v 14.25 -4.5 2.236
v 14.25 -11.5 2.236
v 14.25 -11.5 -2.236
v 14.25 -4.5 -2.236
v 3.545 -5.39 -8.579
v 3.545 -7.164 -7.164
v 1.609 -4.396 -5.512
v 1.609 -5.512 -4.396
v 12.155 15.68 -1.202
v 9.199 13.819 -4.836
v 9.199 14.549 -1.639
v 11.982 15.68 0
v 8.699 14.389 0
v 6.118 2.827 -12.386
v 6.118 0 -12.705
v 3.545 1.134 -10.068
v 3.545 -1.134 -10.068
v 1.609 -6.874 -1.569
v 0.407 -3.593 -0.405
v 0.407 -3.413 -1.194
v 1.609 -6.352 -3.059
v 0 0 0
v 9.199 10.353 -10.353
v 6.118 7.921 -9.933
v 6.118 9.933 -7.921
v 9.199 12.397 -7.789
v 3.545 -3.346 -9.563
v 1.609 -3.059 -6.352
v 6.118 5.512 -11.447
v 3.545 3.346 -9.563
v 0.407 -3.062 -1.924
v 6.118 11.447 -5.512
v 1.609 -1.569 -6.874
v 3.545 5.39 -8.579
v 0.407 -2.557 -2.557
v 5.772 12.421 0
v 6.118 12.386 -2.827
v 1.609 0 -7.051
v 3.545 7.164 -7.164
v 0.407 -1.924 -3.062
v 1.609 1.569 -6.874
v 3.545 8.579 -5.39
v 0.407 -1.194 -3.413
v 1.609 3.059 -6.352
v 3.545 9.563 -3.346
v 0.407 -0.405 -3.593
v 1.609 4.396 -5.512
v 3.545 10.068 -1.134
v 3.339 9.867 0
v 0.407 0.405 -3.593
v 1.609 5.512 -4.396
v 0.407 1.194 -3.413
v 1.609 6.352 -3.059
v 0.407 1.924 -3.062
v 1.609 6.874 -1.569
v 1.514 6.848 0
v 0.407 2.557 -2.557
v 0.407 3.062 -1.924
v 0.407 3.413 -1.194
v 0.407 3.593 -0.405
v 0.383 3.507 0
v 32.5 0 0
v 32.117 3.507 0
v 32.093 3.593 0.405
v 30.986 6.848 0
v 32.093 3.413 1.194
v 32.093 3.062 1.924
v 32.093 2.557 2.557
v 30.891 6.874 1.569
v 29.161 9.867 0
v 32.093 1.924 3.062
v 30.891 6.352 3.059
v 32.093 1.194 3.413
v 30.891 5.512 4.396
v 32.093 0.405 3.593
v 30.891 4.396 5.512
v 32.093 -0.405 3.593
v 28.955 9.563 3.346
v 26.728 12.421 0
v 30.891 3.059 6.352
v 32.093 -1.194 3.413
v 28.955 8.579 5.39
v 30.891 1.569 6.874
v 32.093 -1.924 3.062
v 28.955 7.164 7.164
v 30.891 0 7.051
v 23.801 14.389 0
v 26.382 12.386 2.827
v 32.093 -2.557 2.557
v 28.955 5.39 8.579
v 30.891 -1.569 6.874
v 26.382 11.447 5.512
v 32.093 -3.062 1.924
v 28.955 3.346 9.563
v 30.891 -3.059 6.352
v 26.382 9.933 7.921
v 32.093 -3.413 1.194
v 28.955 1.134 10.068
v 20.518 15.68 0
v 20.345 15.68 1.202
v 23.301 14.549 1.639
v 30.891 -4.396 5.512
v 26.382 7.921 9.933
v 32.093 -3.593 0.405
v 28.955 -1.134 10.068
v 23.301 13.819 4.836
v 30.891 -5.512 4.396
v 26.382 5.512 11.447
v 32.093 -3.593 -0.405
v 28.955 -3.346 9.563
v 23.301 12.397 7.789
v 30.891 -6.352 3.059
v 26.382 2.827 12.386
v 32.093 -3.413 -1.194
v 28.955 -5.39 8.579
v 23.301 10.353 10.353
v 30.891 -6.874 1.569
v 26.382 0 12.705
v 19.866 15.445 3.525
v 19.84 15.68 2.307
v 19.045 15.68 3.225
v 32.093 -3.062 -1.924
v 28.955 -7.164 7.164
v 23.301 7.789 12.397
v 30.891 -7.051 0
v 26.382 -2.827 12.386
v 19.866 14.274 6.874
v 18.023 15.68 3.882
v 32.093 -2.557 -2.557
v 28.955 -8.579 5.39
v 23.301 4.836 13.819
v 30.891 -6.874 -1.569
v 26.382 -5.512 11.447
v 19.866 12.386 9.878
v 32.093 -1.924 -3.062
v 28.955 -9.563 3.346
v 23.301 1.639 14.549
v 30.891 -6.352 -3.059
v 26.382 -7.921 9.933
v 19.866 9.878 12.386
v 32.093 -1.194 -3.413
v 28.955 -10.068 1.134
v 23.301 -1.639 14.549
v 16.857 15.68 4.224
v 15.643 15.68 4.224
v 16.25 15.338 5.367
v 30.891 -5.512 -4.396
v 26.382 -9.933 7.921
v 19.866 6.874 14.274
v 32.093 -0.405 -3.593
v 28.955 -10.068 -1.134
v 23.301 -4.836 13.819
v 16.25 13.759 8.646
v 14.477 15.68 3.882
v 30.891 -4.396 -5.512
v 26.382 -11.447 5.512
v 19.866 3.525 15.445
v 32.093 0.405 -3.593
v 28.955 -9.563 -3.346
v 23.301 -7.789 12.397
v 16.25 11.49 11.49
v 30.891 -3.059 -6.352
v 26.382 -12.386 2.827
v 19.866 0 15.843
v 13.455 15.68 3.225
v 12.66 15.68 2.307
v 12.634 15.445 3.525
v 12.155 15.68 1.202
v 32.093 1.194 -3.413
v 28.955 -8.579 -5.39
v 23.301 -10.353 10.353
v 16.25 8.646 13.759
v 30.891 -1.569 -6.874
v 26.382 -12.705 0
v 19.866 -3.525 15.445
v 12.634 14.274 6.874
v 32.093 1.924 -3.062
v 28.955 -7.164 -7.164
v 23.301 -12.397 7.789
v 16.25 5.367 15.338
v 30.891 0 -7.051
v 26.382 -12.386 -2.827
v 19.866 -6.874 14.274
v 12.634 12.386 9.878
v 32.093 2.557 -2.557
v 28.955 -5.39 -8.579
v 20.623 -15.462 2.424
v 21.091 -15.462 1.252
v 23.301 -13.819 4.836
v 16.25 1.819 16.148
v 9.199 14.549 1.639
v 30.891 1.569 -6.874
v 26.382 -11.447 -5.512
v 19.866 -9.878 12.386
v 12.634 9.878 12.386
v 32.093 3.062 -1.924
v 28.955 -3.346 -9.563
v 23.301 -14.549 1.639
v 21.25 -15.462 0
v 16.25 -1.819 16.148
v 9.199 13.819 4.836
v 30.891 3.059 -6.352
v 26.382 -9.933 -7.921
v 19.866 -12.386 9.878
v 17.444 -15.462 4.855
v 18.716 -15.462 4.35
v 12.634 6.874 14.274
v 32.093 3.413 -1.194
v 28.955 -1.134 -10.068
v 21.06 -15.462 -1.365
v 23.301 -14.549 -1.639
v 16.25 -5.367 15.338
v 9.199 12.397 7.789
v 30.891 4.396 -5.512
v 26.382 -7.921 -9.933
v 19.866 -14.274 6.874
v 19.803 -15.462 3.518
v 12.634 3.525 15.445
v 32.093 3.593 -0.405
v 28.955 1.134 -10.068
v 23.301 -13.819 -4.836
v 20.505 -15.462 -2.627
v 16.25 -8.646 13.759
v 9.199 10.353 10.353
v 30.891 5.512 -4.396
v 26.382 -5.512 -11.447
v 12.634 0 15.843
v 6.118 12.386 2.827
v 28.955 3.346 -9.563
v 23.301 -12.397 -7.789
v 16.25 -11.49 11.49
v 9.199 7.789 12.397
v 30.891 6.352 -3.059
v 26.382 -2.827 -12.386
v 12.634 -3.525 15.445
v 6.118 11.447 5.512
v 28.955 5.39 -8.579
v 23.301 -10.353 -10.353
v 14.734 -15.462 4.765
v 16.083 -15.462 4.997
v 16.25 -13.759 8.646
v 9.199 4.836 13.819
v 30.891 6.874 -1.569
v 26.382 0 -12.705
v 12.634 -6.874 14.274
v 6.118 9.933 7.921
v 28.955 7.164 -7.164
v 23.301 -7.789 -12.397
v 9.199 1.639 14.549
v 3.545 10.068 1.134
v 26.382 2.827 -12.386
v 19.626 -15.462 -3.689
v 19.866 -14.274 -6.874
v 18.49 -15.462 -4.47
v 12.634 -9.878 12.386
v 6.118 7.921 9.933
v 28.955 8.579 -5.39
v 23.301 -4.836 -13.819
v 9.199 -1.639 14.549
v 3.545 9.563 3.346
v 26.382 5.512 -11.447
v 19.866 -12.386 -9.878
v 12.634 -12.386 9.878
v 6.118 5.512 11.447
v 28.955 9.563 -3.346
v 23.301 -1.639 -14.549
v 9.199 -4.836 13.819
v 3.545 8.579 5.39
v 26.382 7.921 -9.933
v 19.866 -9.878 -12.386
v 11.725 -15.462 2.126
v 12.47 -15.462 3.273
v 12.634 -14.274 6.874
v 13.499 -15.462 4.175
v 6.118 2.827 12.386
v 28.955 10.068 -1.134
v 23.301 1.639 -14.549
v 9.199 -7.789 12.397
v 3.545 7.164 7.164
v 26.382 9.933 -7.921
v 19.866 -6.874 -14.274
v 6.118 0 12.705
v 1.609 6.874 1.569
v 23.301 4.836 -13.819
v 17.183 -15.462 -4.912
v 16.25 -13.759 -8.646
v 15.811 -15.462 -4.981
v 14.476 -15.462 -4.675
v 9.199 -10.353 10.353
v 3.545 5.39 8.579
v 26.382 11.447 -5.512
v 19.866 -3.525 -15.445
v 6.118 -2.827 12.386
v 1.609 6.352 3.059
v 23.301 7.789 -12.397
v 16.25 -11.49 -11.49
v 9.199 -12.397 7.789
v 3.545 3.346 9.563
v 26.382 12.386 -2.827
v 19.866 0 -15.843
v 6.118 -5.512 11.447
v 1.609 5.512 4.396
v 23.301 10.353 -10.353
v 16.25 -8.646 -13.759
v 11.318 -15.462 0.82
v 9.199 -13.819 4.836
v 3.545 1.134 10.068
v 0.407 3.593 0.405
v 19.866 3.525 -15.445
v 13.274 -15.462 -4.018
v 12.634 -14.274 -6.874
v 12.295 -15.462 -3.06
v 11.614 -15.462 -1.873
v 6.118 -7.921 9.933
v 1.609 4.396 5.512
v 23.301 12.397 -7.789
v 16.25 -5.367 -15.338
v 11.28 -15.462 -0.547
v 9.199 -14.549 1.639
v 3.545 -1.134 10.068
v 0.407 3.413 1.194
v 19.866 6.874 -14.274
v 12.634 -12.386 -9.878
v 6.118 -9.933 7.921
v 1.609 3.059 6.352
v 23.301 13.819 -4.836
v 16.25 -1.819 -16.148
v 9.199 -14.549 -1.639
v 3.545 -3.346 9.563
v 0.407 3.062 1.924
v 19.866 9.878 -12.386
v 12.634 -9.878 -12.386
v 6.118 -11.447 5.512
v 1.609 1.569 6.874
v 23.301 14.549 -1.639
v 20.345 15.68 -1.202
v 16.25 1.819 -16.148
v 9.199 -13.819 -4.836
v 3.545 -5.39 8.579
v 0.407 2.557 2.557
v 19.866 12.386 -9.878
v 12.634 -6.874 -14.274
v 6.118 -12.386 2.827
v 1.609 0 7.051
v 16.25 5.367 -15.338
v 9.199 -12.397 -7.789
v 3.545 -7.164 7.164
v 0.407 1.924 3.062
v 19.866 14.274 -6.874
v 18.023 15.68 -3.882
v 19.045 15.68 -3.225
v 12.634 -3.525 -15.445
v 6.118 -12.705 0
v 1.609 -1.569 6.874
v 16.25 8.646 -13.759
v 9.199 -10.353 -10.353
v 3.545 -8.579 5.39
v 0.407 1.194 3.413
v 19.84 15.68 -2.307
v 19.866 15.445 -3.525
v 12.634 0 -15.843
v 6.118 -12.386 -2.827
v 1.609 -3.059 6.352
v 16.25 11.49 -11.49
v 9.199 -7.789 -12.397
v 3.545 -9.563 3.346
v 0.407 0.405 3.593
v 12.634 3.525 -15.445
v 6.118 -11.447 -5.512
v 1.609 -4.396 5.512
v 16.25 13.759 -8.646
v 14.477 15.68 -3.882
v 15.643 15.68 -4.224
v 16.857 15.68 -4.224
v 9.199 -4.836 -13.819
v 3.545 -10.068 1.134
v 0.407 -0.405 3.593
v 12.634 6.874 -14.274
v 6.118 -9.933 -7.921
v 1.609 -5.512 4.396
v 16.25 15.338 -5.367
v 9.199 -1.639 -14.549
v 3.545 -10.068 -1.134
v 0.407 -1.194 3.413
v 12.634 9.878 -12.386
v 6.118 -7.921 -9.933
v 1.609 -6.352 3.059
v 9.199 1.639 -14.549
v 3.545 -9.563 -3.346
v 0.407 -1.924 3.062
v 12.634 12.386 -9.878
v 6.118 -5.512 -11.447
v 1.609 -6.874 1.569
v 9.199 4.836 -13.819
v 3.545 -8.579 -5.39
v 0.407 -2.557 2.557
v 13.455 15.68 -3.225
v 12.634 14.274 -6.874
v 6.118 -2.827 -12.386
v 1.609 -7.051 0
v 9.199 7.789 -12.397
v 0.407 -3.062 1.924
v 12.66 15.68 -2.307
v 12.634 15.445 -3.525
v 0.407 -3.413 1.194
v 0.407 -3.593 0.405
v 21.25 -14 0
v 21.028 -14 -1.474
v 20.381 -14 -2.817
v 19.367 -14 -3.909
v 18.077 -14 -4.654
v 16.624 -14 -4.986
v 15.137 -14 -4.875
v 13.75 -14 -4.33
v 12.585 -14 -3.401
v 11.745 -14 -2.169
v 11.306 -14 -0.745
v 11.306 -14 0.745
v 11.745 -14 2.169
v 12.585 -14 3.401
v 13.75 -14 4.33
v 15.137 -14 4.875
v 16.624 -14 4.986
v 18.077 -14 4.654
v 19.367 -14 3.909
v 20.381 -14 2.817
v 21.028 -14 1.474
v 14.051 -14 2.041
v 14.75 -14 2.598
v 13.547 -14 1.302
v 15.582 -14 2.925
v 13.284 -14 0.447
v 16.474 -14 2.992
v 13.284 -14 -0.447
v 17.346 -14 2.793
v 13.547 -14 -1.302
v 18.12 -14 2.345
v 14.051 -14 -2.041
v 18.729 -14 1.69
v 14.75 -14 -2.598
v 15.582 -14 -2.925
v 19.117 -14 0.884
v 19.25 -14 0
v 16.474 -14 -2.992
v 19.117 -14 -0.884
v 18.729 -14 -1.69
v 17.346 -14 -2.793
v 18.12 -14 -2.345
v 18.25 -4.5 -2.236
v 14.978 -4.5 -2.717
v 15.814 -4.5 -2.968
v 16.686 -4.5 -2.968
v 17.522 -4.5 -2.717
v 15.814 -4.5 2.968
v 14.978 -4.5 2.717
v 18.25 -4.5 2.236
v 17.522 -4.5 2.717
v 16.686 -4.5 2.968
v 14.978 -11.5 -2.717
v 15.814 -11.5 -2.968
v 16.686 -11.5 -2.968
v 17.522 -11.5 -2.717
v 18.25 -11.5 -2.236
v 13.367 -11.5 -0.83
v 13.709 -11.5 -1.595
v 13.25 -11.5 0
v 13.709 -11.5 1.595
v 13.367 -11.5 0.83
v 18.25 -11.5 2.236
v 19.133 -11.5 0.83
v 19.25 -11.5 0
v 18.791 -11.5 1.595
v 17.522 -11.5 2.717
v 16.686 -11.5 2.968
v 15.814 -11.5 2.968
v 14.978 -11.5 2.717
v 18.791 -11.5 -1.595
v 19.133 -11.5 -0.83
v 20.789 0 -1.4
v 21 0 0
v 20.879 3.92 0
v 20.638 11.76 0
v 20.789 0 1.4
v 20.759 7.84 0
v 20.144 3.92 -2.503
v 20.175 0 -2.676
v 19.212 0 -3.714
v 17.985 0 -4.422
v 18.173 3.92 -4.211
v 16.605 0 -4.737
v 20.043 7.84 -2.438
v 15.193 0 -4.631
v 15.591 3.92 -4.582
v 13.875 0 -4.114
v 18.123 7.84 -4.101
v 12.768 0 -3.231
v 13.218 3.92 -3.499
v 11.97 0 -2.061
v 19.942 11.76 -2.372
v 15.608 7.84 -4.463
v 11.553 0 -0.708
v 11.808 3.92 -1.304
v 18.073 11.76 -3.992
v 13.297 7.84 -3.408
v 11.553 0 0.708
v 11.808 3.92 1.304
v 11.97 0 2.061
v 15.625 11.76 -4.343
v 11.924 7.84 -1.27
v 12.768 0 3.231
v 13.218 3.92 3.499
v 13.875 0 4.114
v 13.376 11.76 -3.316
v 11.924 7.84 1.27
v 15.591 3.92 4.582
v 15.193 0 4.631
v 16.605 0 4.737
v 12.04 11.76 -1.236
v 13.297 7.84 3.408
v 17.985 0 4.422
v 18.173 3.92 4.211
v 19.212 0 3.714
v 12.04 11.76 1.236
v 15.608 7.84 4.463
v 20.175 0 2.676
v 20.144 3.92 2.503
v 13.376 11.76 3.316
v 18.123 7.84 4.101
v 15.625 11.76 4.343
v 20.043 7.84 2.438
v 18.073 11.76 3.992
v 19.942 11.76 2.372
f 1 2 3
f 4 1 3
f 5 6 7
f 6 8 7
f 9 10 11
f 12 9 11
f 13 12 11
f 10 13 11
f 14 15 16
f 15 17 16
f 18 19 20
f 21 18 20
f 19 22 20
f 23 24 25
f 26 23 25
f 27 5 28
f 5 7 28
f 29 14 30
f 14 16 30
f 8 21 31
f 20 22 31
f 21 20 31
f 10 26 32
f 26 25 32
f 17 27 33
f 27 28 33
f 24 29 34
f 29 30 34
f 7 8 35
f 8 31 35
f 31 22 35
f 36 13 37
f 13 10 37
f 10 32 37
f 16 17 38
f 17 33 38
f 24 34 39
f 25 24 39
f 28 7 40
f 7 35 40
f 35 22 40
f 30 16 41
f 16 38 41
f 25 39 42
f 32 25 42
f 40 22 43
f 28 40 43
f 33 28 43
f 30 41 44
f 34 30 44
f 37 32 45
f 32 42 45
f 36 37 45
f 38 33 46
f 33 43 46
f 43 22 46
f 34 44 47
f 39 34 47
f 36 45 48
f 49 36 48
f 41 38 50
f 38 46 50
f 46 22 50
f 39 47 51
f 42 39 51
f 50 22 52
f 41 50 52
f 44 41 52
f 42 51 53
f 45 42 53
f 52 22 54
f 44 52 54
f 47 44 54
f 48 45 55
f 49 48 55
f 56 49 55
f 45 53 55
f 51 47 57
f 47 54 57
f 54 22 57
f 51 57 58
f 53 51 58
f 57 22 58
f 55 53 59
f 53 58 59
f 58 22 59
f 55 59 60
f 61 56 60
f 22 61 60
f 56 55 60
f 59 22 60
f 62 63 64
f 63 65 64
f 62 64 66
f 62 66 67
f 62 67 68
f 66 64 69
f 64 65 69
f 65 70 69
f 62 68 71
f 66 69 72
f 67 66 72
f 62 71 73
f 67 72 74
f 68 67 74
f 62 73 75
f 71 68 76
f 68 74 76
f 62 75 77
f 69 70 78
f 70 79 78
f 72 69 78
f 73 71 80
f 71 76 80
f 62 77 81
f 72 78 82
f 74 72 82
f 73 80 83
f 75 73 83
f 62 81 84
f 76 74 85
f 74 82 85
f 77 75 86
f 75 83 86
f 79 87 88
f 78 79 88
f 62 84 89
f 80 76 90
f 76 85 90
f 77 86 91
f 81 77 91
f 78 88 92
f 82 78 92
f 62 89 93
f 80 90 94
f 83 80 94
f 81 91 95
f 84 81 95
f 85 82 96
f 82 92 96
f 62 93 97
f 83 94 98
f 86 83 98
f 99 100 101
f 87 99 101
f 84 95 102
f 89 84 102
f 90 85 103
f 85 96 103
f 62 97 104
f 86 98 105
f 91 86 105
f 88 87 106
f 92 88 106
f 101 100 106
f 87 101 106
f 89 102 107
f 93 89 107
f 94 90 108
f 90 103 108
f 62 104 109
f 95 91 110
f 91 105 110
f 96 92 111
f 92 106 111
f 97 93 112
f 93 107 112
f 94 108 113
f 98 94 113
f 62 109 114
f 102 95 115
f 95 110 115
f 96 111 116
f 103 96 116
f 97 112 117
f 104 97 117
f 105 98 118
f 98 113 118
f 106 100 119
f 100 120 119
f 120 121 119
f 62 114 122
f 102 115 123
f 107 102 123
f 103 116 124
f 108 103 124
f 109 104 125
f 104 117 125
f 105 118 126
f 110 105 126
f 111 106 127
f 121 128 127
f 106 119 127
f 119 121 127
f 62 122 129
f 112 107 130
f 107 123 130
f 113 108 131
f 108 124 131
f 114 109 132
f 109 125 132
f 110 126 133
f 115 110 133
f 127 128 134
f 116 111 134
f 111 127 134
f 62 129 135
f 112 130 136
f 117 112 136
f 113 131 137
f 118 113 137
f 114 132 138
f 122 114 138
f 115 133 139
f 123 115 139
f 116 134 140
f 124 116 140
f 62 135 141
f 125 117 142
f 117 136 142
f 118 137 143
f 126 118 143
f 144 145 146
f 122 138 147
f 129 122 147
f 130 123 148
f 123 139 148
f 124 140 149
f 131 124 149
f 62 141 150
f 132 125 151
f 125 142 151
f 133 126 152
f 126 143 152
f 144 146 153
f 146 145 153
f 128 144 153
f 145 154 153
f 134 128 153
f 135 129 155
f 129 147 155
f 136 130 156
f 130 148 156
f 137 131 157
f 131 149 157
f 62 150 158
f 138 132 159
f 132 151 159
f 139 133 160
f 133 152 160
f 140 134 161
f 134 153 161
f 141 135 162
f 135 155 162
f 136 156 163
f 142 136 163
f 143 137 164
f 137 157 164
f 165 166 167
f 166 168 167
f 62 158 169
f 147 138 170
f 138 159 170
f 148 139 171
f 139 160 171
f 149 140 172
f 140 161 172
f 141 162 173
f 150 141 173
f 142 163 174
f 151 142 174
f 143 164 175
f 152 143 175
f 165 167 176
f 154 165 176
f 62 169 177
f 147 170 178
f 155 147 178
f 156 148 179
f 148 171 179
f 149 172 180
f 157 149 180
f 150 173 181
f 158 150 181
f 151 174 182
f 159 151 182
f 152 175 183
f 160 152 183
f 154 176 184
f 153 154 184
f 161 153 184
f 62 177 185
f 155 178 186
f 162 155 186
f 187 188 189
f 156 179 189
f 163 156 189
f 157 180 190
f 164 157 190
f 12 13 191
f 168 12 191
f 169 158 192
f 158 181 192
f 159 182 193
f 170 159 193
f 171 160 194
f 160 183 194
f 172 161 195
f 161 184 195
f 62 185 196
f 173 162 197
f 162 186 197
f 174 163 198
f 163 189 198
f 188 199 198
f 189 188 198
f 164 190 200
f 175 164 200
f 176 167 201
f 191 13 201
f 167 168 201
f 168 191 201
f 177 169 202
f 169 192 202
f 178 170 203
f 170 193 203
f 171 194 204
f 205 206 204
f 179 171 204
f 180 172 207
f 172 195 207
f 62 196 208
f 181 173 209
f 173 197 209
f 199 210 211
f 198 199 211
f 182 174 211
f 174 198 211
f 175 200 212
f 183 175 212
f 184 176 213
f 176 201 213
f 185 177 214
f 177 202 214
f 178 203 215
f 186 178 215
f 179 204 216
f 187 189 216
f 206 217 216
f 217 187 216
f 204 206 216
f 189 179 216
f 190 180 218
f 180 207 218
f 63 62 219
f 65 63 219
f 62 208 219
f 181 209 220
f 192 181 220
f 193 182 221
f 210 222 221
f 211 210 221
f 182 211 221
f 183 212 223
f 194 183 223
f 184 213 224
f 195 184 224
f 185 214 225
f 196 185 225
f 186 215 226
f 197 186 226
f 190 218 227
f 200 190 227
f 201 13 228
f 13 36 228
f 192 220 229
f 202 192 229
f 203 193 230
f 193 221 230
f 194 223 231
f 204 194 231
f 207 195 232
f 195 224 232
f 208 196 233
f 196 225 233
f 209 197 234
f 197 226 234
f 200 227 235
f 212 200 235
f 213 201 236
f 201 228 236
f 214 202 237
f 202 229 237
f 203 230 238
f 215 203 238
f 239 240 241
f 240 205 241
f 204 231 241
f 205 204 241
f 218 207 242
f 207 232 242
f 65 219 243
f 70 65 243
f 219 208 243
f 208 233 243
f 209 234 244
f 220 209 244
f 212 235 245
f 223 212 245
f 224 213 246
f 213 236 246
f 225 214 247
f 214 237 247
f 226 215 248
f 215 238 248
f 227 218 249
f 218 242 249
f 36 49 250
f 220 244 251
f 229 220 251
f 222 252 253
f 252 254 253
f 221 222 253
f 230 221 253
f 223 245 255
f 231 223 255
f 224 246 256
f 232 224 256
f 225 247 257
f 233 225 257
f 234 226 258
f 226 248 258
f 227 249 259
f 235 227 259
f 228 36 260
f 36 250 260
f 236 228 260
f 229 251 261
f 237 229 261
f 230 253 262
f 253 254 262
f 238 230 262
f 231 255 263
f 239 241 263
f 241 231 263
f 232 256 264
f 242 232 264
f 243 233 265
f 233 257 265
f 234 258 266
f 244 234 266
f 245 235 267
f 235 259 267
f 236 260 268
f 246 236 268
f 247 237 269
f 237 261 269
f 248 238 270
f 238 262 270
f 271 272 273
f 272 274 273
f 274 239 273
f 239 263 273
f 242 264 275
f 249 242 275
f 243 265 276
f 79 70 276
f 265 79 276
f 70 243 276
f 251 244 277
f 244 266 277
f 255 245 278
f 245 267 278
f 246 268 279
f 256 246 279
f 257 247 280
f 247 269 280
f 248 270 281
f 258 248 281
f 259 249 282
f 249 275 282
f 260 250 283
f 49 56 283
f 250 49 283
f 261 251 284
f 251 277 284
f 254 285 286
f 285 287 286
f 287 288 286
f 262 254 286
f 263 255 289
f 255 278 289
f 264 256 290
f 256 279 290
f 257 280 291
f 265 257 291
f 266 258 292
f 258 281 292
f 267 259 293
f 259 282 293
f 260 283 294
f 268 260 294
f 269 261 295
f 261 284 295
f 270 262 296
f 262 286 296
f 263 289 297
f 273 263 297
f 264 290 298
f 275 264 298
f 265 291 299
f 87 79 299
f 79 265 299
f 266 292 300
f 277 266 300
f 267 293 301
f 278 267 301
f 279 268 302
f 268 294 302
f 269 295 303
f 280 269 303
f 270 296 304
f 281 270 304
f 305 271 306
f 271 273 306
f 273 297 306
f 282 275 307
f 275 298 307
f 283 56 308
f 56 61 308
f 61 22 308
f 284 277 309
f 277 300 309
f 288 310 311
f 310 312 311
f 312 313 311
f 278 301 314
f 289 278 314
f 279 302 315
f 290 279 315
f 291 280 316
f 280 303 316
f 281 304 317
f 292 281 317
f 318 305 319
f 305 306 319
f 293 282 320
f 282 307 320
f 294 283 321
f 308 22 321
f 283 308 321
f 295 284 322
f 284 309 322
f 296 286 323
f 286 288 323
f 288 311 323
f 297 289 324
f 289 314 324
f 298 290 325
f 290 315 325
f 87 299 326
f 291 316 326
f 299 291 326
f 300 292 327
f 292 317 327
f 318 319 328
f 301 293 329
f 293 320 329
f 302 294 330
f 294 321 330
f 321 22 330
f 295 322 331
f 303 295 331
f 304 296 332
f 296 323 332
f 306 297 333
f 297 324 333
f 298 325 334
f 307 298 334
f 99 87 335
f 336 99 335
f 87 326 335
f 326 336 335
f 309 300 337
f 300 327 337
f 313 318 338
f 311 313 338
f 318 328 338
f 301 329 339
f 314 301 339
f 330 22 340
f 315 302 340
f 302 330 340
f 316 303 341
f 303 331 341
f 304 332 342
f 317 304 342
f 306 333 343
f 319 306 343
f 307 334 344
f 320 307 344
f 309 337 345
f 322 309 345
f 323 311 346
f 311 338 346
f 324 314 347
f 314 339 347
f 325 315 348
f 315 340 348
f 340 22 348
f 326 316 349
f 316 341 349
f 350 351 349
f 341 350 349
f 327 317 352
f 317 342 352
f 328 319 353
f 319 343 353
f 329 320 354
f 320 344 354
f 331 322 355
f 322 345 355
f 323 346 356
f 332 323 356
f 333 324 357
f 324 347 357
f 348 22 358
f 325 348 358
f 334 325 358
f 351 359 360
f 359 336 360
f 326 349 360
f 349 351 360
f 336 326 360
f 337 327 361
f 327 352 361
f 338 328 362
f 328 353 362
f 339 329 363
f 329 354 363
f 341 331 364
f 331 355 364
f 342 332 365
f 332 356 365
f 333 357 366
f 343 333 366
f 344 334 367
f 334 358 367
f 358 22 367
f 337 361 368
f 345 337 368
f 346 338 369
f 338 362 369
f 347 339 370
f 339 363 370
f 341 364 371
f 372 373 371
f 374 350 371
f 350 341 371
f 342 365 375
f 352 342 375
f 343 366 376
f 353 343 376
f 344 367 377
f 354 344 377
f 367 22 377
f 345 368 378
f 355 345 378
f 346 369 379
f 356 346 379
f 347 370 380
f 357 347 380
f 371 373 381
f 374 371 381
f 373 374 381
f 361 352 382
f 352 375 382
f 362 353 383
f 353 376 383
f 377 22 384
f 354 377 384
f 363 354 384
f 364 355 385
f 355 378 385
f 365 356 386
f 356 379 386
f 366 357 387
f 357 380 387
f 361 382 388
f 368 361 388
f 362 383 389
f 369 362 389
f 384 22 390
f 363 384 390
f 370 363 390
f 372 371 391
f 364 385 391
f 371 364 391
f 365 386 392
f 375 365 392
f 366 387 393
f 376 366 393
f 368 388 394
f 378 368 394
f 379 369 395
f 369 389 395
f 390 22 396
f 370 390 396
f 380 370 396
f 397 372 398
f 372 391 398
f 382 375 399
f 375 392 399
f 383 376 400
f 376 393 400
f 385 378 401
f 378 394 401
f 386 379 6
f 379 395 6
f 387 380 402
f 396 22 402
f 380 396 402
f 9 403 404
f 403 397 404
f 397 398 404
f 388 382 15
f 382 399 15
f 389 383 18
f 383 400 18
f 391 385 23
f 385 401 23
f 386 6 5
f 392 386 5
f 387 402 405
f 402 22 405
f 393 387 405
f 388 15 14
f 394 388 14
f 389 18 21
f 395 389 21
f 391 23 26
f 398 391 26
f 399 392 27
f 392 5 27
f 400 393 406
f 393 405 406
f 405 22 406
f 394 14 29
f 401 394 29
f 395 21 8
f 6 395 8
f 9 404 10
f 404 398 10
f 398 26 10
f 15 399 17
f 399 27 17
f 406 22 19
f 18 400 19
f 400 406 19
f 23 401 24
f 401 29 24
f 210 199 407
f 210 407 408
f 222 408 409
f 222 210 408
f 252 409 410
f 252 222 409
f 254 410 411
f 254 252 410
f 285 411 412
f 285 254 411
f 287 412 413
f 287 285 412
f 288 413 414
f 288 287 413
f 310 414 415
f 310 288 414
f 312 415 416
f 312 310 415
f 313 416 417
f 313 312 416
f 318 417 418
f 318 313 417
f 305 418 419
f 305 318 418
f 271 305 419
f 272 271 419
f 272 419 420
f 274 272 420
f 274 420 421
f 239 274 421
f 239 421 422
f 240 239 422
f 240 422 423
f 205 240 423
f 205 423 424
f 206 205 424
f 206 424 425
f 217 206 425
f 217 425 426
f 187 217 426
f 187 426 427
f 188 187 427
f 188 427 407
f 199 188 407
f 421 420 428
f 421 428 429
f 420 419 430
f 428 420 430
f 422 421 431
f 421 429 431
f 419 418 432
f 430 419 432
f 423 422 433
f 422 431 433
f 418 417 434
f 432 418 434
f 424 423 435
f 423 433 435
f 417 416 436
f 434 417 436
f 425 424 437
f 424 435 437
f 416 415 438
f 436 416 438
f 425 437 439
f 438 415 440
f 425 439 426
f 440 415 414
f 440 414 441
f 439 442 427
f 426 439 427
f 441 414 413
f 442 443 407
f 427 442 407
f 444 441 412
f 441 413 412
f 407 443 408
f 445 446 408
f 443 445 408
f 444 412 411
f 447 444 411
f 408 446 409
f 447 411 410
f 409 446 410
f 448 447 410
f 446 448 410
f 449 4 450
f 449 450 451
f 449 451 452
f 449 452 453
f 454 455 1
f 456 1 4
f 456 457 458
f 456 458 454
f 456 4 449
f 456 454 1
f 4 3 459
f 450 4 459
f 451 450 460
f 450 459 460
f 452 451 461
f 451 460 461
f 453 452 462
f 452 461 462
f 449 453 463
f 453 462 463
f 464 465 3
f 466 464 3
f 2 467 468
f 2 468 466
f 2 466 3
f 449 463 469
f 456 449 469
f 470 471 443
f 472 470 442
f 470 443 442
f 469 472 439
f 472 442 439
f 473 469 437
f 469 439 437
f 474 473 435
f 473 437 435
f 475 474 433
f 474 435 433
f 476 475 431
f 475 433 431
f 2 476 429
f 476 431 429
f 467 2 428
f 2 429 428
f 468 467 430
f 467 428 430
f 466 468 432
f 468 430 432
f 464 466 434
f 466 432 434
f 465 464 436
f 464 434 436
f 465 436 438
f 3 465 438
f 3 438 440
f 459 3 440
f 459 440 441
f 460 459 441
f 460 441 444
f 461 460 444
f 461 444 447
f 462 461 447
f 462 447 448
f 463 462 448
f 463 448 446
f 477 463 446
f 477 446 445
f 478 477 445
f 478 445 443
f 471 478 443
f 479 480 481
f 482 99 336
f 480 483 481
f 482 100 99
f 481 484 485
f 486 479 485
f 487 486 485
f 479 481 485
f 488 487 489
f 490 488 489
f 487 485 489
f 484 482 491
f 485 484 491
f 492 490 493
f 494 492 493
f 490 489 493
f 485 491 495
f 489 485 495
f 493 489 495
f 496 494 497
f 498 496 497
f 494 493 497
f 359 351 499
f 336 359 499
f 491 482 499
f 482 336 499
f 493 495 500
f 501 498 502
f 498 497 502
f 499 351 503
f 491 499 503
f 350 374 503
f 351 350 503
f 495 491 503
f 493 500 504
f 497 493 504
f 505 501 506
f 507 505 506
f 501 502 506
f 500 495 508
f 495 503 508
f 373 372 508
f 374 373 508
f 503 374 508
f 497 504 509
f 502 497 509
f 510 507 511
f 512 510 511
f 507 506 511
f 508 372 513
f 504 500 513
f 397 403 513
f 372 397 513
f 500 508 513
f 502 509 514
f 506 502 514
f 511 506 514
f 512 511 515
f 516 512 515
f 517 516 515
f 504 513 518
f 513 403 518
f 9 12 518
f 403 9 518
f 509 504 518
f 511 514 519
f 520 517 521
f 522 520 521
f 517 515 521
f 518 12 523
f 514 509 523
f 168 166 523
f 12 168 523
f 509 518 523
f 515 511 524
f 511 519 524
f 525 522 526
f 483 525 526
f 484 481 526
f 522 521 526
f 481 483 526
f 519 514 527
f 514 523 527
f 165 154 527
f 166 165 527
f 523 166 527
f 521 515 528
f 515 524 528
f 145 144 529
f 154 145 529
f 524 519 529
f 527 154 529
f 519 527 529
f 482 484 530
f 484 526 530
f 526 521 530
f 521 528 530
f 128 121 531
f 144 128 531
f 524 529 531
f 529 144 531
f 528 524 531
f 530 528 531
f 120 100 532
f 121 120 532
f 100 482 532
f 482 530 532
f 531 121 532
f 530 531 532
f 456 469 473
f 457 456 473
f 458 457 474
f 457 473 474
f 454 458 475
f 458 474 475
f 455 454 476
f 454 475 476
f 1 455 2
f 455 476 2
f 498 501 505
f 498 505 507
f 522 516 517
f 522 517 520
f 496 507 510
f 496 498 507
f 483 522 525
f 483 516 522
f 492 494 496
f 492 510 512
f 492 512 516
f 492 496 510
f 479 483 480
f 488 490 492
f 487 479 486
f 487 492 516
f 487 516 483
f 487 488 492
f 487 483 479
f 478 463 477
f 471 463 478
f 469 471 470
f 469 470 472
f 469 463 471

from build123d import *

# Parameters (mm, degrees)
SKETCH4_R          = 4.75
SKETCH3_R          = 4.25
SKETCH7_R          = 5
CUT_EXTRUDE4_DEPTH = 3
SKETCH8_R          = 3
CUT_EXTRUDE5_DEPTH = 2.5
CUT_EXTRUDE6_DEPTH = 7


with BuildPart() as part:
    # Sketch2 → Revolve1 (revolve)
    with BuildSketch(Plane.XY):
        with BuildLine():
            Line((0, 0), (32.5, 0))
            ThreePointArc((32.5, 0), (16.25, 16.25), (0, 0))
        make_face()
    revolve(axis=Axis((0, 0, 0), (1, 0, 0)))

    # Sketch4 → Cut-Loft1 section 0
    with BuildSketch(Plane(origin=(0, 0, 0), x_dir=(1, 0, 0), z_dir=(0, 1, 0))):
        with Locations((16.25, 0)):
            Circle(SKETCH4_R)
    # Sketch3 → Cut-Loft1 section 1
    with BuildSketch(Plane(origin=(0, 16.25, 0), x_dir=(1, 0, 0), z_dir=(0, 1, 0))):
        with Locations((16.25, 0)):
            Circle(SKETCH3_R)
    loft(mode=Mode.SUBTRACT)

    # Sketch7 → Cut-Extrude4 (cut)
    with BuildSketch(Plane(origin=(0, -17, 0), x_dir=(1, 0, 0), z_dir=(0, 1, 0))):
        with Locations((16.25, 0)):
            Circle(SKETCH7_R)
    extrude(amount=CUT_EXTRUDE4_DEPTH, mode=Mode.SUBTRACT)

    # Sketch8 → Cut-Extrude5 (cut)
    with BuildSketch(Plane.XZ.offset(14)):
        with Locations((16.25, 0)):
            Circle(SKETCH8_R)
    extrude(amount=-CUT_EXTRUDE5_DEPTH, mode=Mode.SUBTRACT)

    # Sketch9 → Cut-Extrude6 (cut)
    with BuildSketch(Plane.XZ.offset(11.5)):
        with BuildLine():
            Line((14.25, 2.236067977), (14.25, -2.236067977))
            ThreePointArc((14.25, -2.236067977), (16.25, -3), (18.25, -2.236067977))
            Line((18.25, -2.236067977), (18.25, 2.236067977))
            ThreePointArc((18.25, 2.236067977), (16.25, 3), (14.25, 2.236067977))
        make_face()
    extrude(amount=-CUT_EXTRUDE6_DEPTH, mode=Mode.SUBTRACT)


solid = part.part
